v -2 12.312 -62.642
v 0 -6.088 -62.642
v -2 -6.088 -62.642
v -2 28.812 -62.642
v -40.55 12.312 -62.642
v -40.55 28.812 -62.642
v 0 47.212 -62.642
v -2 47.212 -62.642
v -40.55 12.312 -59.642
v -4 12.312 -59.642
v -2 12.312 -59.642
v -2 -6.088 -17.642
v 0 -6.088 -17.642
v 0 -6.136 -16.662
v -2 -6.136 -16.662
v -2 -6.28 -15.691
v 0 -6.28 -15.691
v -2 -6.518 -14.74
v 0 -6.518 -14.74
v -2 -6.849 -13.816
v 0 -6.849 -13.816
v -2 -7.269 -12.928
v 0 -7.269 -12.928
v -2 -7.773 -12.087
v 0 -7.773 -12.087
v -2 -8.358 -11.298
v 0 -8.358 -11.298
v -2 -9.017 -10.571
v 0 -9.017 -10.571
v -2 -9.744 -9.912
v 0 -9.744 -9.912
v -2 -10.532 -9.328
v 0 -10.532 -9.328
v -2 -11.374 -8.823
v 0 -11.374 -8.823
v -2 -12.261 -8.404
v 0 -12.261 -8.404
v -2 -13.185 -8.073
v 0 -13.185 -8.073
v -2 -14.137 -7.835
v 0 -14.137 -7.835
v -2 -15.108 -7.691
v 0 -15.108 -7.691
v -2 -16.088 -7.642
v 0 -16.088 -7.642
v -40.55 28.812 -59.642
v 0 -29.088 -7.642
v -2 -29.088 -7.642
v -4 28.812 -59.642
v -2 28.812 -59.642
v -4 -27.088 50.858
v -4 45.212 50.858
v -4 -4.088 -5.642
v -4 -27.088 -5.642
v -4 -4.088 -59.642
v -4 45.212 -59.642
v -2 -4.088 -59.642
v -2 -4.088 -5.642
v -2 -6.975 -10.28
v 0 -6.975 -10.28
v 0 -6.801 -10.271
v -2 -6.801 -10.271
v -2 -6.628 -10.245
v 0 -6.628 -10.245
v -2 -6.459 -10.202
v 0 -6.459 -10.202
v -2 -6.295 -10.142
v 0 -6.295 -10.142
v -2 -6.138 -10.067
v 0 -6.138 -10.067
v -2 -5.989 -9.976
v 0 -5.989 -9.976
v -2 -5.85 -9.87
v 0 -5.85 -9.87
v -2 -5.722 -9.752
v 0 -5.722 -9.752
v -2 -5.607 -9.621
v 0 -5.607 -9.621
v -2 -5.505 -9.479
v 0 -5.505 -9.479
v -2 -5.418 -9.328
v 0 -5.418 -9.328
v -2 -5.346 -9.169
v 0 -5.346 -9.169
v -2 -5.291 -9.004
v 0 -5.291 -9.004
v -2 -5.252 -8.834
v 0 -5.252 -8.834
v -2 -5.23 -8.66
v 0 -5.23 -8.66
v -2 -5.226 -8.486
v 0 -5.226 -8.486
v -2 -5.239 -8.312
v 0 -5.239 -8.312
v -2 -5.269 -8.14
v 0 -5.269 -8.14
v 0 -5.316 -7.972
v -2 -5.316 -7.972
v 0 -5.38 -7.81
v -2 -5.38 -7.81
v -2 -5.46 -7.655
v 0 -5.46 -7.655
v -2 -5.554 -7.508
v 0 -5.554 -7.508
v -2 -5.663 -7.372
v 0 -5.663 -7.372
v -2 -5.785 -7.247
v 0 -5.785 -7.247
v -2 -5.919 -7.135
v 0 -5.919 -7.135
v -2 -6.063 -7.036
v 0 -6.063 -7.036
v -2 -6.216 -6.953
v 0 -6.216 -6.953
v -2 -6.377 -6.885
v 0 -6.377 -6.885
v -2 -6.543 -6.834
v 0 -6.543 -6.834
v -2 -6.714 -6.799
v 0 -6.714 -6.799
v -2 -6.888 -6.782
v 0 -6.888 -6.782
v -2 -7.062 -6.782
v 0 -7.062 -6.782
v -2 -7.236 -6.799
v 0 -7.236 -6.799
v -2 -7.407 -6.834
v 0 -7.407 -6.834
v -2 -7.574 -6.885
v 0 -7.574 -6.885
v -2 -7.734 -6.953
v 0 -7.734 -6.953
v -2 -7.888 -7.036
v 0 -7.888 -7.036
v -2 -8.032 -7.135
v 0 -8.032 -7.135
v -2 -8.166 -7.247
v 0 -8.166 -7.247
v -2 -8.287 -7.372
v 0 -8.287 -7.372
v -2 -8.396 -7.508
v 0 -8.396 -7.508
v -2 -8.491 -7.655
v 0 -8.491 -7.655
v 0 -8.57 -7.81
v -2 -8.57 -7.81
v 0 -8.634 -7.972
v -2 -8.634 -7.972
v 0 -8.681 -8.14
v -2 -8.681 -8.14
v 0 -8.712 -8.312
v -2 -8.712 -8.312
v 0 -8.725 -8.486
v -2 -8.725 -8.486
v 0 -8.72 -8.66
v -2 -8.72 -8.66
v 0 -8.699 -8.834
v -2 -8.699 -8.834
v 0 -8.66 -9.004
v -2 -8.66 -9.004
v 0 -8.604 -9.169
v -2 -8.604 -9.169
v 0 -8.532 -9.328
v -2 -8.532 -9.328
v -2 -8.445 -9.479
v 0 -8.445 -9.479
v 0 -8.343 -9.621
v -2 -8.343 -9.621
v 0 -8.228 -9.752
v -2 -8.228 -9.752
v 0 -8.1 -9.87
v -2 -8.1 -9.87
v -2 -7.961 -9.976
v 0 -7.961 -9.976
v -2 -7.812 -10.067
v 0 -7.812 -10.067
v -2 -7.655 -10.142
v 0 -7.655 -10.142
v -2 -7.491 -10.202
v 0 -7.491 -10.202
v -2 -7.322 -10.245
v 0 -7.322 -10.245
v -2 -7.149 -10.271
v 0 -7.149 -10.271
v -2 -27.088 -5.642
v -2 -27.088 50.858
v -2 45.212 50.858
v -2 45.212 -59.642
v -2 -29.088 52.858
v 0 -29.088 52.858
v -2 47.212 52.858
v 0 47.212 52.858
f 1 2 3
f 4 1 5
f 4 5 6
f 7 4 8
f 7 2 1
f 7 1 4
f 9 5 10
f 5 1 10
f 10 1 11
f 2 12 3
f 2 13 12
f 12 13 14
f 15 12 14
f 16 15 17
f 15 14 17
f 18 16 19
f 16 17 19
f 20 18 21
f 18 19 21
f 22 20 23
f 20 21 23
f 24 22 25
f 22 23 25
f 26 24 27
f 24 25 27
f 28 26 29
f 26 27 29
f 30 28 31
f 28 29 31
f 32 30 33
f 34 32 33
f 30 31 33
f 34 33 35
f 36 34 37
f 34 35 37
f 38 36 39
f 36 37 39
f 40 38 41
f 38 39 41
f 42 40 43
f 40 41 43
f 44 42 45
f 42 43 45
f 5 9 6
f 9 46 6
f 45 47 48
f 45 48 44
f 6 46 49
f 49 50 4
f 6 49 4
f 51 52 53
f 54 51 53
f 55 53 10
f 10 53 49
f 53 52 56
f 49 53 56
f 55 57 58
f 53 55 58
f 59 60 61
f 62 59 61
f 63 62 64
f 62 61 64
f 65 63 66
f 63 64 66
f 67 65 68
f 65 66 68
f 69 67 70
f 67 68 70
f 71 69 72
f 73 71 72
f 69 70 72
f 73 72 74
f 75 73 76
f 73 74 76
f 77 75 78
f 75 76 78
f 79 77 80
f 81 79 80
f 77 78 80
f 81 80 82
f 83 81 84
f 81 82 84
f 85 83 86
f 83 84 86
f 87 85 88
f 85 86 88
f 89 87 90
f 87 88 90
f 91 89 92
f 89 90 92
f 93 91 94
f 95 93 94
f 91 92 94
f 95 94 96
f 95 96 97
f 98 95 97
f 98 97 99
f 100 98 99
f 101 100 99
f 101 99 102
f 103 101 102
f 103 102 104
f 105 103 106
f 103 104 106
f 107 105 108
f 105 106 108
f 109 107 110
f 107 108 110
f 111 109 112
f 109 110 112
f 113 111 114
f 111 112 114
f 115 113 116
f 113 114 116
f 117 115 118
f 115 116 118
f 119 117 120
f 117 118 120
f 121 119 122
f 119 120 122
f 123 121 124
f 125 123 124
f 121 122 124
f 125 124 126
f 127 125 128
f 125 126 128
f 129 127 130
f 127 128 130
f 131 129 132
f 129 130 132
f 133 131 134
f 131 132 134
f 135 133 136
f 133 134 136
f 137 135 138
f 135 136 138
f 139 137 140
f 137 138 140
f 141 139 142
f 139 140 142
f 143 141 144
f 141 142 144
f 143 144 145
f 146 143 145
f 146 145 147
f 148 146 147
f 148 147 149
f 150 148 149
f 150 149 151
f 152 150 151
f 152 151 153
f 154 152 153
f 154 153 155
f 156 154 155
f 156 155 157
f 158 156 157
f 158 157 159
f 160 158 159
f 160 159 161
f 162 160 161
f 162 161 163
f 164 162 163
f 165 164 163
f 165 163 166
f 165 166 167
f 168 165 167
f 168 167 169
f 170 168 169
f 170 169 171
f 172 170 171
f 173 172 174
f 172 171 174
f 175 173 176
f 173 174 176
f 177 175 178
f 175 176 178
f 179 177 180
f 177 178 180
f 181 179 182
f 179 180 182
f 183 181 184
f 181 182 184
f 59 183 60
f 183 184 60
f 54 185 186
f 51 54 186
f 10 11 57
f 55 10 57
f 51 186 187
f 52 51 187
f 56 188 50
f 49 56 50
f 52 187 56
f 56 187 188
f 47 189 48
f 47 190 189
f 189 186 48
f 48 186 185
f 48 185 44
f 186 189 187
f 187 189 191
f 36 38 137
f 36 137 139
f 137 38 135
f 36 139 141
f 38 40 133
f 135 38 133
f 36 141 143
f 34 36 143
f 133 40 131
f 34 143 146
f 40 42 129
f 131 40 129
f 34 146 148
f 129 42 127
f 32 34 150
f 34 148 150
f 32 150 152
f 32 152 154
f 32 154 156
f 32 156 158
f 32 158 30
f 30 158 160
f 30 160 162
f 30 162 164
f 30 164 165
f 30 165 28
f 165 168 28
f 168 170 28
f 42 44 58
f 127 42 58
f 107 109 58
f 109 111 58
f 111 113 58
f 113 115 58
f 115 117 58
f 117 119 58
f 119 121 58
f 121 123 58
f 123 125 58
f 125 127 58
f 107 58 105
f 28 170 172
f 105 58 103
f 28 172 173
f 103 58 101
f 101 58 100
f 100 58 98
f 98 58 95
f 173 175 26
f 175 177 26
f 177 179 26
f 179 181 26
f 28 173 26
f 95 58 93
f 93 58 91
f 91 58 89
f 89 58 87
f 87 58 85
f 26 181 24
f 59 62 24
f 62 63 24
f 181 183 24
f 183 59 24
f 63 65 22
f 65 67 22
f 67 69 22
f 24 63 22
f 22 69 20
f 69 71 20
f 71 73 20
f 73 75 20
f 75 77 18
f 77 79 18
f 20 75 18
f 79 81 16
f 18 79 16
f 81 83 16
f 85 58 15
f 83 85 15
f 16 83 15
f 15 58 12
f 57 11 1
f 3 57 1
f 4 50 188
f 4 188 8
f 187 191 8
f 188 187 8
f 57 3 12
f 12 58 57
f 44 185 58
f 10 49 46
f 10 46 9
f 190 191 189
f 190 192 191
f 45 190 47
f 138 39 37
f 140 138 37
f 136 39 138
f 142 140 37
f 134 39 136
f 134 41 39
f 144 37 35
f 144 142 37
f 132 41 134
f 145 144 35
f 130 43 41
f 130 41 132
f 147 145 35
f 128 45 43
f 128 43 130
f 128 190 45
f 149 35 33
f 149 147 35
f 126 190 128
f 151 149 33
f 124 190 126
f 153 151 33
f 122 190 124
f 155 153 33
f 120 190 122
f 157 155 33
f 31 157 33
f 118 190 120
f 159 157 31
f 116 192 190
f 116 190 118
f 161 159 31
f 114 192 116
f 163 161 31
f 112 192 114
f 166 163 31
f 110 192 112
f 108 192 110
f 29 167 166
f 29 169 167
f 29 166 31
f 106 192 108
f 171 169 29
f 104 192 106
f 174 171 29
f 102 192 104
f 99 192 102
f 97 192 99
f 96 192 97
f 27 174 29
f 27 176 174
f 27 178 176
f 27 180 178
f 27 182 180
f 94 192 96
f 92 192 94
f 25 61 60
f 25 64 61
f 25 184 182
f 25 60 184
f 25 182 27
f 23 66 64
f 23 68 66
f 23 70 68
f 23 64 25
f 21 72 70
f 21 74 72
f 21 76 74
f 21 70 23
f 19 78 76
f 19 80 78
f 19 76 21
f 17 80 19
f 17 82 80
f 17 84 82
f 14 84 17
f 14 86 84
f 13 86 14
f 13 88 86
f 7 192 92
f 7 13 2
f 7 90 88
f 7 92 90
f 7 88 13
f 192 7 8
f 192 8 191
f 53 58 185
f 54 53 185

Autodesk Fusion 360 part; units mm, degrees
sketch "Sketch1" plane through (0, 0, 0) normal (1, 0, 0) x (0, 0, -1)
  line L0 (-50.8576, -27.0879) -> (-50.8576, 45.2121)
  line L1 (62.6424, 47.2121) -> (-52.8576, 47.2121)
  line L2 (59.6424, 28.8121) -> (62.6424, 28.8121)
  line L3 (62.6424, 28.8121) -> (62.6424, 47.2121)
  line L4 (59.6424, 12.3121) -> (59.6424, -4.0879)
  line L5 (59.6424, 45.2121) -> (59.6424, 28.8121)
  line L6 (-50.8576, 45.2121) -> (59.6424, 45.2121)
  line L7 (17.6424, -6.0879) -> (62.6424, -6.0879)
  line L8 (59.6424, -4.0879) -> (5.6424, -4.0879)
  line L9 (62.6424, 12.3121) -> (59.6424, 12.3121)
  line L10 (-52.8576, 47.2121) -> (-52.8576, -29.0879)
  line L11 (-52.8576, -29.0879) -> (7.6424, -29.0879)
  line L12 (5.6424, -27.0879) -> (-50.8576, -27.0879)
  line L13 (5.6424, -4.0879) -> (5.6424, -27.0879)
  line L14 (7.6424, -29.0879) -> (7.6424, -16.0879)
  line L15 (62.6424, -6.0879) -> (62.6424, 12.3121)
  line L16 (59.6424, 28.8121) -> (59.6424, 12.3121)
  line L17 (62.6424, 12.3121) -> (62.6424, 28.8121)
  arc A0 (17.6424, -6.0879) -> (7.6424, -16.0879) centre (17.6424, -16.0879) ccw
  point P0 (62.6424, -13.1879)
  dimension "d9" = 10
extrude "Extrude1" add sketch "Sketch1" against normal blind 4 contours L0 L4 L5 L6 L8 L12 L13 L16
extrude "Extrude2" add sketch "Sketch1" against normal blind 2 contours L0 L1 L2 L3 L4 L5 L6 L7 L8 L9 L10 L11 L12 L13 L14 L15 A0
extrude "Extrude3" add sketch "Sketch1" against normal blind 40.55 contours L2 L9 L16 L17
sketch "Sketch3" plane through (0, 0, 0) normal (1, 0, 0) x (0, 0, -1)
  line L0 (62.6424, -6.0879) -> (62.6424, 47.2121)
  line L1 (62.6424, 47.2121) -> (-52.8576, 47.2121)
  line L2 (-52.8576, 47.2121) -> (-52.8576, -29.0879)
  line L3 (-52.8576, -29.0879) -> (7.6424, -29.0879)
  line L4 (7.6424, -29.0879) -> (7.6424, -16.0879)
  arc A0 (17.6424, -6.0879) -> (7.6424, -16.0879) centre (17.6424, -16.0879) ccw
  line L5 (17.6424, -6.0879) -> (62.6424, -6.0879)
  circle A1 centre (8.5297, -6.9752) radius 1.75
  line L6 (5.6424, -4.0879) -> (5.6424, -27.0879) construction
  line L7 (59.6424, -4.0879) -> (5.6424, -4.0879) construction
  line L8 (8.5297, -5.2252) -> (8.5297, -4.0879) construction
  line L9 (6.7797, -6.9752) -> (5.6424, -6.9752) construction
  line L10 (9.7672, -8.2126) -> (10.5714, -9.0168) construction
  point P0 (5.6424, -4.0879)
  dimension "d10" = 3.5
extrude "Extrude4" cut sketch "Sketch3" against normal blind 2 contours A1
